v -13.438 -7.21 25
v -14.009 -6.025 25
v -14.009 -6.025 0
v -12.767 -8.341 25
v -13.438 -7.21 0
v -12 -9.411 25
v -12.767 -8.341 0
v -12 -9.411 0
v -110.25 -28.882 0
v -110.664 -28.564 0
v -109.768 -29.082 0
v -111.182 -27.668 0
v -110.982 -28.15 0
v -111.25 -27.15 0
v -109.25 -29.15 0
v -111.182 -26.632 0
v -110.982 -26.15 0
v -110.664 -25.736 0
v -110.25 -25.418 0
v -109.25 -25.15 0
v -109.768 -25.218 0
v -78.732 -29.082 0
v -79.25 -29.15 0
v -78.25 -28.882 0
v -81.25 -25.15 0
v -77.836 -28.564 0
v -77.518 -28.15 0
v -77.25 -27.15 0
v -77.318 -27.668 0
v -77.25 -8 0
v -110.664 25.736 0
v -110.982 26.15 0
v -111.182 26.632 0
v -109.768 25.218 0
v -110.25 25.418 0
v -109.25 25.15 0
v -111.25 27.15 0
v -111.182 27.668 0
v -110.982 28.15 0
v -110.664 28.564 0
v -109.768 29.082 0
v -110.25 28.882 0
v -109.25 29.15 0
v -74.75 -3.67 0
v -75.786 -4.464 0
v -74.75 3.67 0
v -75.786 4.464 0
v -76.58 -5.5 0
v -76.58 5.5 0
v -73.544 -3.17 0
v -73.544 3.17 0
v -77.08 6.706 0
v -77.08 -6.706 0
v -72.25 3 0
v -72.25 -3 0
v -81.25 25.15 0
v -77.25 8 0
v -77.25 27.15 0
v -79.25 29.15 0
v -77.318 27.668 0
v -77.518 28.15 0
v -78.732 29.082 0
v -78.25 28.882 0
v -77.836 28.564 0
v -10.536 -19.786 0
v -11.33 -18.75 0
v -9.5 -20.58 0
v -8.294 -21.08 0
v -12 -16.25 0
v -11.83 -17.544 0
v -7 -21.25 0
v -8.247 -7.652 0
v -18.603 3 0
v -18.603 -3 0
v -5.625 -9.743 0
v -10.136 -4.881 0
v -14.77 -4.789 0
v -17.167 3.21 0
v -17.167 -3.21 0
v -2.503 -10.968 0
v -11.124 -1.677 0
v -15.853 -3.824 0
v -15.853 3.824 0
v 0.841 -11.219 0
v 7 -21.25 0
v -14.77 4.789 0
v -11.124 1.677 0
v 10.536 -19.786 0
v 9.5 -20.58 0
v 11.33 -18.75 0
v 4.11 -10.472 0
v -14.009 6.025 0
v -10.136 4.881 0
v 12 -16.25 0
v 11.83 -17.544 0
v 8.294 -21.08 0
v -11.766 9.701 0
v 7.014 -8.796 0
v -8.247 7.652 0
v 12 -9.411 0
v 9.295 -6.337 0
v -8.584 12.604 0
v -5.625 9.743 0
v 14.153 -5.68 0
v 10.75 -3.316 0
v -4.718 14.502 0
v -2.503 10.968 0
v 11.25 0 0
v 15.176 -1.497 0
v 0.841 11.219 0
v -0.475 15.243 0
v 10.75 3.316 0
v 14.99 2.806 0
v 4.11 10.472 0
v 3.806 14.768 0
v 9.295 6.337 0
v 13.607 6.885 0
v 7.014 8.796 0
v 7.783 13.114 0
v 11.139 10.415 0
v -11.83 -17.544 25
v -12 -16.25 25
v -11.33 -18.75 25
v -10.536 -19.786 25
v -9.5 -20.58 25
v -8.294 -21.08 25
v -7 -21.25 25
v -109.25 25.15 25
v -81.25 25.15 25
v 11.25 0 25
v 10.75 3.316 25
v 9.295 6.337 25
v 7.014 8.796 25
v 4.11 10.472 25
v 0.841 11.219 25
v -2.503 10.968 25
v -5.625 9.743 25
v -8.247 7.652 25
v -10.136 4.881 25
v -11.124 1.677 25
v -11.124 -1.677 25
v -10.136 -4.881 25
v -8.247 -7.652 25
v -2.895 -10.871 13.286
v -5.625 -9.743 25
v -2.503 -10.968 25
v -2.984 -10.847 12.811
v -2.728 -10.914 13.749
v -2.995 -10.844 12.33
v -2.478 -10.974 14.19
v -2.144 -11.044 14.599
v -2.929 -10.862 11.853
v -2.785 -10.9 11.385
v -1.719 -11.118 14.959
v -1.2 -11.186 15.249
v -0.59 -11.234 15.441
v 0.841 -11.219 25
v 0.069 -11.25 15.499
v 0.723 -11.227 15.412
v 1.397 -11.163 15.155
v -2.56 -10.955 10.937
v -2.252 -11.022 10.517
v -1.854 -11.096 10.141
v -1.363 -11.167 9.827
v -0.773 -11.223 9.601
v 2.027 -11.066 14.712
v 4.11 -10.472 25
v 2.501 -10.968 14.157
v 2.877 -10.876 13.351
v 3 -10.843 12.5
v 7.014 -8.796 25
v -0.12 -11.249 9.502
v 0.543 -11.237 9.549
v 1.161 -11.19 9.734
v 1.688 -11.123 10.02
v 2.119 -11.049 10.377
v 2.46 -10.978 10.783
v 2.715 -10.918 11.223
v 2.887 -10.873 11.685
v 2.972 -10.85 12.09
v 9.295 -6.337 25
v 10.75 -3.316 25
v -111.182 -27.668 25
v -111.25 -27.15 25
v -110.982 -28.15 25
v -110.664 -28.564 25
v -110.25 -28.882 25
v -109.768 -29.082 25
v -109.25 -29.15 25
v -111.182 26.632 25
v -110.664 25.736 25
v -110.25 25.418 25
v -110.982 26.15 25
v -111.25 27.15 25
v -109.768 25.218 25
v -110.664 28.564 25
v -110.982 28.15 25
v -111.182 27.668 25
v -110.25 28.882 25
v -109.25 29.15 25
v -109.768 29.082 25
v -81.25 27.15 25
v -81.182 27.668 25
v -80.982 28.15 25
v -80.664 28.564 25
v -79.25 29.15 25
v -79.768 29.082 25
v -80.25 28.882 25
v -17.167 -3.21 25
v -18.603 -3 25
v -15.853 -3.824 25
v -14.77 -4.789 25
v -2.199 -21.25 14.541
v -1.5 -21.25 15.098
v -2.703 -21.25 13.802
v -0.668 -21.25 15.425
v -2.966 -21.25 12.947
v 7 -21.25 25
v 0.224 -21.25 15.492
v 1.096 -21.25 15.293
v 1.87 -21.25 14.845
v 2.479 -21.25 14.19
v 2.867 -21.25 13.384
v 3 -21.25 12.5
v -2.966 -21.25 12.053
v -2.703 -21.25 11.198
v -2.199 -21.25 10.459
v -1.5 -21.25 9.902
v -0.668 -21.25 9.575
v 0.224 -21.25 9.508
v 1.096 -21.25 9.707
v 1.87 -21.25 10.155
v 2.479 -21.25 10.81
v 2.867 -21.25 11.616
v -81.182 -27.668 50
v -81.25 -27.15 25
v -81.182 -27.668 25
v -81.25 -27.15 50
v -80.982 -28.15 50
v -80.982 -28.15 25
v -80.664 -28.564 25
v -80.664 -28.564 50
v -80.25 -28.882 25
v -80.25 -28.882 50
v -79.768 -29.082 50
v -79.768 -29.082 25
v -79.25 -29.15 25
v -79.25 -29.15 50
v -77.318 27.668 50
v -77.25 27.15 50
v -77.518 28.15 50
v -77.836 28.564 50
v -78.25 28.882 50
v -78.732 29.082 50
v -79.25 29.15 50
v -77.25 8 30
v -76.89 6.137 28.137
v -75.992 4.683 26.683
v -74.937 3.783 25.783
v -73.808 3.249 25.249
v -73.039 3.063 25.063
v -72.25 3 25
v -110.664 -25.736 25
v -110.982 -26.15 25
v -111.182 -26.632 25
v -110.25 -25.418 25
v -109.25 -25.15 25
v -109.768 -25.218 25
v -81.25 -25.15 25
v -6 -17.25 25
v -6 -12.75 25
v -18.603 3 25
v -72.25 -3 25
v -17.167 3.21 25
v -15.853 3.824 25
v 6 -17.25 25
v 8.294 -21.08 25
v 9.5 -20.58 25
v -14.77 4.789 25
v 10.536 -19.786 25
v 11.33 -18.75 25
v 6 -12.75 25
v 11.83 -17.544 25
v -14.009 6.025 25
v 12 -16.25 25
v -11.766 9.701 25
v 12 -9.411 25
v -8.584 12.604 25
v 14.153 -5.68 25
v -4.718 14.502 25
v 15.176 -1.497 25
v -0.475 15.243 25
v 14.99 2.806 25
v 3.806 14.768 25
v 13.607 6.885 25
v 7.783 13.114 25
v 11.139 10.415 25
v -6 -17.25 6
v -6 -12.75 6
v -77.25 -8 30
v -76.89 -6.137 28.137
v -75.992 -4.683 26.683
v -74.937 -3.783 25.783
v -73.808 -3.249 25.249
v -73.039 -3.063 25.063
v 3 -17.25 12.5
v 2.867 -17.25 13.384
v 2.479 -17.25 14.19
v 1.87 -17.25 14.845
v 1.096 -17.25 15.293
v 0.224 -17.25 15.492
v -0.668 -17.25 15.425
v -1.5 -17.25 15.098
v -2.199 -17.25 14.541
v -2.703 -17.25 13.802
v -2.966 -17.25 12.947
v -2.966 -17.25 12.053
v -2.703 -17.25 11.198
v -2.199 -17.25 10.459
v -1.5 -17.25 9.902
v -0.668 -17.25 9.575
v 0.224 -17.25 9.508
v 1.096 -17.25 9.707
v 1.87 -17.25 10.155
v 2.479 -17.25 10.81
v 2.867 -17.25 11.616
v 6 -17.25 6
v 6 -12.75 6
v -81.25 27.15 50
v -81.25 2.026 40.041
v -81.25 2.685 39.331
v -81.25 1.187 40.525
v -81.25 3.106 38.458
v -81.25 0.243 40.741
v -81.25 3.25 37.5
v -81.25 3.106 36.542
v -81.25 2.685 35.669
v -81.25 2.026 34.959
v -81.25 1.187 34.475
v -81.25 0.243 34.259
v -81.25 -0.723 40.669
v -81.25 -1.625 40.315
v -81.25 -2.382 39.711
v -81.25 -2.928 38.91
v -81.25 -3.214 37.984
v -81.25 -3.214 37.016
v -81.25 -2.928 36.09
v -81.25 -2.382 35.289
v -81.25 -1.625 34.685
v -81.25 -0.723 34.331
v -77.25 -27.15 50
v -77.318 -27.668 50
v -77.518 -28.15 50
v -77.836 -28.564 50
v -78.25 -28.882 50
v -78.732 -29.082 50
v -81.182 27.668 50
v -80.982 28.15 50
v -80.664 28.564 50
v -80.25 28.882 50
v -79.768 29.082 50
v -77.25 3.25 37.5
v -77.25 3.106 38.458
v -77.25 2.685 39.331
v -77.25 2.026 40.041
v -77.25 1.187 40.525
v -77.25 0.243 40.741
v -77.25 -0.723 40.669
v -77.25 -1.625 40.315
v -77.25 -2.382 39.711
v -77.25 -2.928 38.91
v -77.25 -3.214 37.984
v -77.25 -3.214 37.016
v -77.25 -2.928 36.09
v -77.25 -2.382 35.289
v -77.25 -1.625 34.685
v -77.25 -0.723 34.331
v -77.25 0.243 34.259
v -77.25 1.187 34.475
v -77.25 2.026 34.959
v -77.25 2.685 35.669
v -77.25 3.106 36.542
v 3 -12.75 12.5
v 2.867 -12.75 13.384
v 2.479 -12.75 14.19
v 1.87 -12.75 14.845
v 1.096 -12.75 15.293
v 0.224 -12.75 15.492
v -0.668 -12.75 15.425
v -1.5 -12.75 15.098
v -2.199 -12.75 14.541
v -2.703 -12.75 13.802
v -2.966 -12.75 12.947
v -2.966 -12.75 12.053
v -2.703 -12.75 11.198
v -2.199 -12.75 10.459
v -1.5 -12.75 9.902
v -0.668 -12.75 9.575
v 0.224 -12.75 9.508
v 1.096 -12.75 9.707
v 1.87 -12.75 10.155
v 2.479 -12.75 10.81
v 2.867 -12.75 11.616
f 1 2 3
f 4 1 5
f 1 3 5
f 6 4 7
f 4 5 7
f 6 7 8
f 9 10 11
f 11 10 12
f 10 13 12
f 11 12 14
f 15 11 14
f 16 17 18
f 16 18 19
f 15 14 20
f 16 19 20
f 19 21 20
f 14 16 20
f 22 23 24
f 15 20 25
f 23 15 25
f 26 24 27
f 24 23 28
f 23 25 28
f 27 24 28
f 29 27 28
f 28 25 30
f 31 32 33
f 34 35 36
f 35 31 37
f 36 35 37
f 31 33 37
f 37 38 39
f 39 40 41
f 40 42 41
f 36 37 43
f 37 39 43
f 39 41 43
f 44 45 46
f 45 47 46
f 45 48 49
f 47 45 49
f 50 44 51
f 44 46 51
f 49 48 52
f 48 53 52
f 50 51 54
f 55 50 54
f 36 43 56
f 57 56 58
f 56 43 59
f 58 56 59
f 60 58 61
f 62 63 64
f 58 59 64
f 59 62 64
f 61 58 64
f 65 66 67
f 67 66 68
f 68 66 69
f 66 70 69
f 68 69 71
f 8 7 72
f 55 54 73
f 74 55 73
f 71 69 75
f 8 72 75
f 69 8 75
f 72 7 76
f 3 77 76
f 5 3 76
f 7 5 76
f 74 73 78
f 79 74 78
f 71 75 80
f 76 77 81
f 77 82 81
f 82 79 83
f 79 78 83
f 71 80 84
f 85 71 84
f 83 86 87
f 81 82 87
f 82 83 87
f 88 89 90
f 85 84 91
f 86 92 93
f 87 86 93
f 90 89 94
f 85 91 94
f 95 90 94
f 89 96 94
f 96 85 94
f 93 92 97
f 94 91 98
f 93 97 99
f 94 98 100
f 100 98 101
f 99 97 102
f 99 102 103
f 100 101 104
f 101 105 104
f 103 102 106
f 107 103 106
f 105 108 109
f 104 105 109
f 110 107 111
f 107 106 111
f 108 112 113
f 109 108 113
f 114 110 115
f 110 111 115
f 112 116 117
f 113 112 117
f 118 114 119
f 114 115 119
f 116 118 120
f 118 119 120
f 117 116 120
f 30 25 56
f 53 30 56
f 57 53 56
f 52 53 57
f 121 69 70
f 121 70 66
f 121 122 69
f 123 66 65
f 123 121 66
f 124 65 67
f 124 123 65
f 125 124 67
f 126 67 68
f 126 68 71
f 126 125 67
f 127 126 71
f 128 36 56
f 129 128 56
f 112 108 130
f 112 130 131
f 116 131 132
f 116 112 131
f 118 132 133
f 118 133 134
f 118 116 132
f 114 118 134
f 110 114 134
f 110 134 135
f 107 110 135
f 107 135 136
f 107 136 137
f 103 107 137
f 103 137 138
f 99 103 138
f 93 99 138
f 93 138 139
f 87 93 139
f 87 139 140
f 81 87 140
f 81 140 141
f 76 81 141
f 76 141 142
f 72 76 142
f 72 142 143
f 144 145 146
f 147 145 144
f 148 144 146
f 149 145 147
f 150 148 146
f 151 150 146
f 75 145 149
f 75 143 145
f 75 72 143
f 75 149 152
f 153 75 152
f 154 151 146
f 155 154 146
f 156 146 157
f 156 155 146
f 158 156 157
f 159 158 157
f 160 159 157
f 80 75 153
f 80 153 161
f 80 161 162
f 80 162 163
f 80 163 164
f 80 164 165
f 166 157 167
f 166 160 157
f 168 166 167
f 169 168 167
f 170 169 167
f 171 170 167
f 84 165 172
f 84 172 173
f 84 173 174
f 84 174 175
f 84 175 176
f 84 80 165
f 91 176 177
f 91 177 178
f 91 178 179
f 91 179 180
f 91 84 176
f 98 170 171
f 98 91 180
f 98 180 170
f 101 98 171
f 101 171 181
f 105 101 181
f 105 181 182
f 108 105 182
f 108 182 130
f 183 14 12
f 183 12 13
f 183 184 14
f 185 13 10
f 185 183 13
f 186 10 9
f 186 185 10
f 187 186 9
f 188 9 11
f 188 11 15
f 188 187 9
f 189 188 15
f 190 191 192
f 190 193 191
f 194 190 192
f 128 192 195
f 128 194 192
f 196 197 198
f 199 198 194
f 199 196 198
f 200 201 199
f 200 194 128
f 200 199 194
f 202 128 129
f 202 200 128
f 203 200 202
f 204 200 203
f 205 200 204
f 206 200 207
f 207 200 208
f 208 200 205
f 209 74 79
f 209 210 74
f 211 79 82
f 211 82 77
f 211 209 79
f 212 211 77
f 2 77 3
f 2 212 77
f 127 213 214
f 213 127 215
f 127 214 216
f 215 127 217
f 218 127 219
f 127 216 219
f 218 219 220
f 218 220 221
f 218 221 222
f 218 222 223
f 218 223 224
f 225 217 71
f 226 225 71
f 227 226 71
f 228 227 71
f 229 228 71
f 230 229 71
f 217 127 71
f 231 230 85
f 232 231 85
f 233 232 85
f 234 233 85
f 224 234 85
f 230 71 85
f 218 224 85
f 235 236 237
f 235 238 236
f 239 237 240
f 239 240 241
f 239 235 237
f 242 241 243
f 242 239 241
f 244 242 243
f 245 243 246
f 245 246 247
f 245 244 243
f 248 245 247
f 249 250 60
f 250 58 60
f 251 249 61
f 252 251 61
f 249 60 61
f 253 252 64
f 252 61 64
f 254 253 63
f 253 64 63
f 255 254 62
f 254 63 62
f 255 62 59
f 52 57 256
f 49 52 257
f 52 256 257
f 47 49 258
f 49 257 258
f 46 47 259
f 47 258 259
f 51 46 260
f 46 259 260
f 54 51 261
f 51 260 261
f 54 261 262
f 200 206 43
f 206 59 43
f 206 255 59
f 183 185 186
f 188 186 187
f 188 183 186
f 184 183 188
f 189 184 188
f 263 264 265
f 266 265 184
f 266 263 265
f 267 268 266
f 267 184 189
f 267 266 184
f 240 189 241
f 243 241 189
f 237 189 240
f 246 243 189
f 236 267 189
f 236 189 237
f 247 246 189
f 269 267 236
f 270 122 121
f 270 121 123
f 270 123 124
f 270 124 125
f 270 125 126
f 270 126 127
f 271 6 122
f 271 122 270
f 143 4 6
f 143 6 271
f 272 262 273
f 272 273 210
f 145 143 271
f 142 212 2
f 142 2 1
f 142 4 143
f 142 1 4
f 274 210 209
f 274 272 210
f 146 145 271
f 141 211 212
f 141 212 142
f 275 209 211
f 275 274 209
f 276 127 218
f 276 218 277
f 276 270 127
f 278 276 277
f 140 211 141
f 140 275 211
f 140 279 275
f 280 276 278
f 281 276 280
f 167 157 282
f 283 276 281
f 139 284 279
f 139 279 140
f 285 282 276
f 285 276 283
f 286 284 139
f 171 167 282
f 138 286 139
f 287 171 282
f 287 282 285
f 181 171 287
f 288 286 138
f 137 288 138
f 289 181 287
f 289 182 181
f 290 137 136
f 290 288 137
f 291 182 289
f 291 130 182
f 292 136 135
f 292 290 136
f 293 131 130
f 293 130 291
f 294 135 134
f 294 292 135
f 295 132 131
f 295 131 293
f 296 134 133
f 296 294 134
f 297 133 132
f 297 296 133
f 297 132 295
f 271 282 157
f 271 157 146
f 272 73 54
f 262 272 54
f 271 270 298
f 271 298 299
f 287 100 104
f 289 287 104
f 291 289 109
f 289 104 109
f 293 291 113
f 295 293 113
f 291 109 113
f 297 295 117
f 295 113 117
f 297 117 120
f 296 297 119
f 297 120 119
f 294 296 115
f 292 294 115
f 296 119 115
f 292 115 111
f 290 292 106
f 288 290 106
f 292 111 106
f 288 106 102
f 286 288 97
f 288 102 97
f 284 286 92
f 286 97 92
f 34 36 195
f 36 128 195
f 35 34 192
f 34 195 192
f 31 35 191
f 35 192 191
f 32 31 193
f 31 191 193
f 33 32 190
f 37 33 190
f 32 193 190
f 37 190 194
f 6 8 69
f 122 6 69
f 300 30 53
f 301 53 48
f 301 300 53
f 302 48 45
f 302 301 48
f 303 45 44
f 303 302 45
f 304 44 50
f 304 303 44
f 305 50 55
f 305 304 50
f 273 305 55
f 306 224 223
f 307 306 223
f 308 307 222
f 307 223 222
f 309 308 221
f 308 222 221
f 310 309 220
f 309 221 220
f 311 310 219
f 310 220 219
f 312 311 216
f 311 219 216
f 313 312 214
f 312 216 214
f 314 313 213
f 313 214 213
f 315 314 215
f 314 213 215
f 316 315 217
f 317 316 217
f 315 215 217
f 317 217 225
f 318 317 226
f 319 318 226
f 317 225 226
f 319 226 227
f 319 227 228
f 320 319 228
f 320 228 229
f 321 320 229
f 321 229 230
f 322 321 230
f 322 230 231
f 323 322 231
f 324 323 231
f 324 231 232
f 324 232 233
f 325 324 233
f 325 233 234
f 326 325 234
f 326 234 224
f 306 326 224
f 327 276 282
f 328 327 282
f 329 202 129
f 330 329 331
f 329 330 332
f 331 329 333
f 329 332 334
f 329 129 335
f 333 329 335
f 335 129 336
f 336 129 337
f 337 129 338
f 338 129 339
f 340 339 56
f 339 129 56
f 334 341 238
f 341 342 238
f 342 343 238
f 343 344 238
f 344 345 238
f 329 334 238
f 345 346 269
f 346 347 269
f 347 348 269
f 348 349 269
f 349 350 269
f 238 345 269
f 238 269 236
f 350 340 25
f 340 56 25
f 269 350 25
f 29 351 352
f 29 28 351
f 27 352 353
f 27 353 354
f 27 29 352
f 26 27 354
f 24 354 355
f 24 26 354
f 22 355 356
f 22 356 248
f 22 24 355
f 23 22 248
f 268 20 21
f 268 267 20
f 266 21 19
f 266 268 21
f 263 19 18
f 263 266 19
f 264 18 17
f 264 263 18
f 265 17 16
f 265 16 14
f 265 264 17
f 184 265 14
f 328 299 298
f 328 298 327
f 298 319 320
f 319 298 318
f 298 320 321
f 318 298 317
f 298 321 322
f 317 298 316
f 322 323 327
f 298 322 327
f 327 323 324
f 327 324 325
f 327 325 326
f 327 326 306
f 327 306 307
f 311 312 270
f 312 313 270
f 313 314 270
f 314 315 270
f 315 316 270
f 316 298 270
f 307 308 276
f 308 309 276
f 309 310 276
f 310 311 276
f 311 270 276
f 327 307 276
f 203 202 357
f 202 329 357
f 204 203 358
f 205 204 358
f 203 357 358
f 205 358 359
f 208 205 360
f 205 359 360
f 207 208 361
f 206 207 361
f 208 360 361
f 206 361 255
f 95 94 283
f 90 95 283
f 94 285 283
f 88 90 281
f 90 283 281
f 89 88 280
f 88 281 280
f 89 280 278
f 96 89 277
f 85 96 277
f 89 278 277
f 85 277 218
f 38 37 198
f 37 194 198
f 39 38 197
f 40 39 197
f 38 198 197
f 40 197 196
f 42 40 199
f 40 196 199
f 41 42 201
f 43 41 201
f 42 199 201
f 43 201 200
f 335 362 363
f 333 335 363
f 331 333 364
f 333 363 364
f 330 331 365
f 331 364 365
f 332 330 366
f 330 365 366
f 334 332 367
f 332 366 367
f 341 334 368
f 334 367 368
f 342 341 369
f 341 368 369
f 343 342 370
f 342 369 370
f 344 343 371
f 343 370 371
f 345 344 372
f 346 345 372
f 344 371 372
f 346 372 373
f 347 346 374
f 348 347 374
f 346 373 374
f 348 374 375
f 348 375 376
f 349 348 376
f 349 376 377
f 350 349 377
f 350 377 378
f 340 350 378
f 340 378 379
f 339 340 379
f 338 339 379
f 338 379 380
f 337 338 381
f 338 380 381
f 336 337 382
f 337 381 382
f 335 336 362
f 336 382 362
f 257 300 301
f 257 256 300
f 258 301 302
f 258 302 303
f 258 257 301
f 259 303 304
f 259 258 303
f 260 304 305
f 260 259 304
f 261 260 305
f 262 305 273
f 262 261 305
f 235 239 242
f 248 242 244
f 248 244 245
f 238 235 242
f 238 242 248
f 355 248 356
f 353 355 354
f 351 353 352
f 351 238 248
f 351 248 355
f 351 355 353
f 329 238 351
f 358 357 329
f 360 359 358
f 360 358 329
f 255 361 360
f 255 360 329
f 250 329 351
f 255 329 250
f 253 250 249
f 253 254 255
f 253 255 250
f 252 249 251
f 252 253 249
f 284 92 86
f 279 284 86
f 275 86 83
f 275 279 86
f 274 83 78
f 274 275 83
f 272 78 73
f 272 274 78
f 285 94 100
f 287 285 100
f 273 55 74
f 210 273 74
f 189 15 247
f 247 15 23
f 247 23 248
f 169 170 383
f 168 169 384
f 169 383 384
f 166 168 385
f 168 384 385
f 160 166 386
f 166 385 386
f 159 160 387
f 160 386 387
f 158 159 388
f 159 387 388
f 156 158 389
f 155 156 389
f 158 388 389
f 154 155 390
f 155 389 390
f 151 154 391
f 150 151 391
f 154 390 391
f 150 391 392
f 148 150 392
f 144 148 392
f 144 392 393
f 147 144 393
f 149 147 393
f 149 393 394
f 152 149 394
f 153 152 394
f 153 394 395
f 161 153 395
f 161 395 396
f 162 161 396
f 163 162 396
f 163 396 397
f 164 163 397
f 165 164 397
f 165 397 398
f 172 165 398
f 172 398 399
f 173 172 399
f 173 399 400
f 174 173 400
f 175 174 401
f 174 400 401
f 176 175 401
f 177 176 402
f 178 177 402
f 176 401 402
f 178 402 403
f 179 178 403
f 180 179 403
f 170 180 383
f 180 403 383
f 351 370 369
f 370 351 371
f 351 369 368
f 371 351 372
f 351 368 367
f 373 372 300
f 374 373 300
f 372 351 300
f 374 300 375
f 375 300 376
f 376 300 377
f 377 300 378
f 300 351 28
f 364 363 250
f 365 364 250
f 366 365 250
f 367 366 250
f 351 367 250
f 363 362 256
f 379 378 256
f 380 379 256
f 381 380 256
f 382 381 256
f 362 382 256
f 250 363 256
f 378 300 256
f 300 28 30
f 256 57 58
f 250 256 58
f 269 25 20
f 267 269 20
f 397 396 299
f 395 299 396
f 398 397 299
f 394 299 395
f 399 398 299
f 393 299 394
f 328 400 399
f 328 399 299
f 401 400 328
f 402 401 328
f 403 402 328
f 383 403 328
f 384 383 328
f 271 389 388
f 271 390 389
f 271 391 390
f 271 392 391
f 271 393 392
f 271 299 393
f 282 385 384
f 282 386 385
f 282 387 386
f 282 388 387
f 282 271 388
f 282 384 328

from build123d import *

# Parameters (mm, degrees)
F0_R     = 11.25
F1_DEPTH = 25
F3_DEPTH = 25
F4_R     = 3.25
F5_DEPTH = 4
F6_W     = 12
F6_H     = 4.5
F7_DEPTH = 19
F8_R     = 3
F9_DEPTH = 12
F10_R    = 5
F11_R    = 5
F12_R    = 1.99999


# Not quite as in the source:
# - a fillet or chamfer is up to 0.001 mm smaller than in the source, because OpenCascade refuses the exact size


with BuildPart() as f1:
    # F0 (on Top) → F1 (new body)
    with BuildSketch(Plane.XY):
        with BuildLine():
            Line((-81.25, 25.15), (-81.25, -25.15))
            Line((-81.25, -25.15), (-111.25, -25.15))
            Line((-111.25, -25.15), (-111.25, -29.15))
            Line((-111.25, -29.15), (-77.25, -29.15))
            Line((-77.25, -29.15), (-77.25, -3))
            Line((-77.25, -3), (-14.9520065543, -3))
            ThreePointArc((-14.9520065543, -3), (-13.8519724825, -6.3785075325), (-12, -9.4107651124))
            Line((-12, -9.4107651124), (-12, -12.3110722522))
            Line((-12, -12.3110722522), (-12, -21.25))
            Line((-12, -21.25), (-9, -21.25))
            Line((-9, -21.25), (9, -21.25))
            Line((9, -21.25), (12, -21.25))
            Line((12, -21.25), (12, -12.3110722522))
            Line((12, -12.3110722522), (12, -9.4107651124))
            ThreePointArc((12, -9.4107651124), (6.3785075325, 13.8519724825), (-14.9520065543, 3))
            Line((-14.9520065543, 3), (-77.25, 3))
            Line((-77.25, 3), (-77.25, 29.15))
            Line((-77.25, 29.15), (-111.25, 29.15))
            Line((-111.25, 29.15), (-111.25, 25.15))
            Line((-111.25, 25.15), (-81.25, 25.15))
        make_face()
        Circle(F0_R, mode=Mode.SUBTRACT)
    extrude(amount=F1_DEPTH)

    # F2 (on face) → F3 (join)
    with BuildSketch(Plane.XY.offset(25)):
        Polygon((-77.25, 3), (-77.25, 29.15), (-81.25, 29.15), (-81.25, 25.15), (-81.25, -25.15), (-81.25, -29.15), (-77.25, -29.15), (-77.25, -3), align=None)
    extrude(amount=F3_DEPTH)

    # F4 (on face) → F5 (cut)
    with BuildSketch(Plane.YZ.offset(-77.25)):
        with Locations((0, 37.5)):
            Circle(F4_R)
    extrude(amount=-F5_DEPTH, mode=Mode.SUBTRACT)

    # F6 (on face) → F7 (cut)
    with BuildSketch(Plane.XY.offset(25)):
        with Locations((0, -15)):
            Rectangle(F6_W, F6_H)
    extrude(amount=-F7_DEPTH, mode=Mode.SUBTRACT)

    # F8 (on face) → F9 (cut)
    with BuildSketch(Plane.XZ.offset(21.25)):
        with Locations((0, 12.5)):
            Circle(F8_R)
    extrude(amount=-F9_DEPTH, mode=Mode.SUBTRACT)

    # F10
    f10_edges = [f1.edges().sort_by_distance(p)[0] for p in [
        (12, -21.25, 12.5),
        (-12, -21.25, 12.5),
        (-77.25, -3, 12.5),
        (-77.25, 3, 12.5),
    ]]
    fillet(f10_edges, radius=F10_R)

    # F11
    f11_edges = [f1.edges().sort_by_distance(p)[0] for p in [
        (-14.952007, 3, 12.5),
        (-14.952007, -3, 12.5),
        (-77.25, 0, 25),
    ]]
    fillet(f11_edges, radius=F11_R)

    # F12 (radius 2 in the source; OpenCascade refuses exactly that, so slightly less here)
    f12_edges = [f1.edges().sort_by_distance(p)[0] for p in [
        (-111.25, 29.15, 12.5),
        (-111.25, -25.15, 12.5),
        (-111.25, -29.15, 12.5),
        (-111.25, 25.15, 12.5),
        (-77.25, 29.15, 25),
        (-81.25, 29.15, 37.5),
        (-77.25, -29.15, 25),
        (-81.25, -29.15, 37.5),
    ]]
    fillet(f12_edges, radius=F12_R)


solid = f1.part
